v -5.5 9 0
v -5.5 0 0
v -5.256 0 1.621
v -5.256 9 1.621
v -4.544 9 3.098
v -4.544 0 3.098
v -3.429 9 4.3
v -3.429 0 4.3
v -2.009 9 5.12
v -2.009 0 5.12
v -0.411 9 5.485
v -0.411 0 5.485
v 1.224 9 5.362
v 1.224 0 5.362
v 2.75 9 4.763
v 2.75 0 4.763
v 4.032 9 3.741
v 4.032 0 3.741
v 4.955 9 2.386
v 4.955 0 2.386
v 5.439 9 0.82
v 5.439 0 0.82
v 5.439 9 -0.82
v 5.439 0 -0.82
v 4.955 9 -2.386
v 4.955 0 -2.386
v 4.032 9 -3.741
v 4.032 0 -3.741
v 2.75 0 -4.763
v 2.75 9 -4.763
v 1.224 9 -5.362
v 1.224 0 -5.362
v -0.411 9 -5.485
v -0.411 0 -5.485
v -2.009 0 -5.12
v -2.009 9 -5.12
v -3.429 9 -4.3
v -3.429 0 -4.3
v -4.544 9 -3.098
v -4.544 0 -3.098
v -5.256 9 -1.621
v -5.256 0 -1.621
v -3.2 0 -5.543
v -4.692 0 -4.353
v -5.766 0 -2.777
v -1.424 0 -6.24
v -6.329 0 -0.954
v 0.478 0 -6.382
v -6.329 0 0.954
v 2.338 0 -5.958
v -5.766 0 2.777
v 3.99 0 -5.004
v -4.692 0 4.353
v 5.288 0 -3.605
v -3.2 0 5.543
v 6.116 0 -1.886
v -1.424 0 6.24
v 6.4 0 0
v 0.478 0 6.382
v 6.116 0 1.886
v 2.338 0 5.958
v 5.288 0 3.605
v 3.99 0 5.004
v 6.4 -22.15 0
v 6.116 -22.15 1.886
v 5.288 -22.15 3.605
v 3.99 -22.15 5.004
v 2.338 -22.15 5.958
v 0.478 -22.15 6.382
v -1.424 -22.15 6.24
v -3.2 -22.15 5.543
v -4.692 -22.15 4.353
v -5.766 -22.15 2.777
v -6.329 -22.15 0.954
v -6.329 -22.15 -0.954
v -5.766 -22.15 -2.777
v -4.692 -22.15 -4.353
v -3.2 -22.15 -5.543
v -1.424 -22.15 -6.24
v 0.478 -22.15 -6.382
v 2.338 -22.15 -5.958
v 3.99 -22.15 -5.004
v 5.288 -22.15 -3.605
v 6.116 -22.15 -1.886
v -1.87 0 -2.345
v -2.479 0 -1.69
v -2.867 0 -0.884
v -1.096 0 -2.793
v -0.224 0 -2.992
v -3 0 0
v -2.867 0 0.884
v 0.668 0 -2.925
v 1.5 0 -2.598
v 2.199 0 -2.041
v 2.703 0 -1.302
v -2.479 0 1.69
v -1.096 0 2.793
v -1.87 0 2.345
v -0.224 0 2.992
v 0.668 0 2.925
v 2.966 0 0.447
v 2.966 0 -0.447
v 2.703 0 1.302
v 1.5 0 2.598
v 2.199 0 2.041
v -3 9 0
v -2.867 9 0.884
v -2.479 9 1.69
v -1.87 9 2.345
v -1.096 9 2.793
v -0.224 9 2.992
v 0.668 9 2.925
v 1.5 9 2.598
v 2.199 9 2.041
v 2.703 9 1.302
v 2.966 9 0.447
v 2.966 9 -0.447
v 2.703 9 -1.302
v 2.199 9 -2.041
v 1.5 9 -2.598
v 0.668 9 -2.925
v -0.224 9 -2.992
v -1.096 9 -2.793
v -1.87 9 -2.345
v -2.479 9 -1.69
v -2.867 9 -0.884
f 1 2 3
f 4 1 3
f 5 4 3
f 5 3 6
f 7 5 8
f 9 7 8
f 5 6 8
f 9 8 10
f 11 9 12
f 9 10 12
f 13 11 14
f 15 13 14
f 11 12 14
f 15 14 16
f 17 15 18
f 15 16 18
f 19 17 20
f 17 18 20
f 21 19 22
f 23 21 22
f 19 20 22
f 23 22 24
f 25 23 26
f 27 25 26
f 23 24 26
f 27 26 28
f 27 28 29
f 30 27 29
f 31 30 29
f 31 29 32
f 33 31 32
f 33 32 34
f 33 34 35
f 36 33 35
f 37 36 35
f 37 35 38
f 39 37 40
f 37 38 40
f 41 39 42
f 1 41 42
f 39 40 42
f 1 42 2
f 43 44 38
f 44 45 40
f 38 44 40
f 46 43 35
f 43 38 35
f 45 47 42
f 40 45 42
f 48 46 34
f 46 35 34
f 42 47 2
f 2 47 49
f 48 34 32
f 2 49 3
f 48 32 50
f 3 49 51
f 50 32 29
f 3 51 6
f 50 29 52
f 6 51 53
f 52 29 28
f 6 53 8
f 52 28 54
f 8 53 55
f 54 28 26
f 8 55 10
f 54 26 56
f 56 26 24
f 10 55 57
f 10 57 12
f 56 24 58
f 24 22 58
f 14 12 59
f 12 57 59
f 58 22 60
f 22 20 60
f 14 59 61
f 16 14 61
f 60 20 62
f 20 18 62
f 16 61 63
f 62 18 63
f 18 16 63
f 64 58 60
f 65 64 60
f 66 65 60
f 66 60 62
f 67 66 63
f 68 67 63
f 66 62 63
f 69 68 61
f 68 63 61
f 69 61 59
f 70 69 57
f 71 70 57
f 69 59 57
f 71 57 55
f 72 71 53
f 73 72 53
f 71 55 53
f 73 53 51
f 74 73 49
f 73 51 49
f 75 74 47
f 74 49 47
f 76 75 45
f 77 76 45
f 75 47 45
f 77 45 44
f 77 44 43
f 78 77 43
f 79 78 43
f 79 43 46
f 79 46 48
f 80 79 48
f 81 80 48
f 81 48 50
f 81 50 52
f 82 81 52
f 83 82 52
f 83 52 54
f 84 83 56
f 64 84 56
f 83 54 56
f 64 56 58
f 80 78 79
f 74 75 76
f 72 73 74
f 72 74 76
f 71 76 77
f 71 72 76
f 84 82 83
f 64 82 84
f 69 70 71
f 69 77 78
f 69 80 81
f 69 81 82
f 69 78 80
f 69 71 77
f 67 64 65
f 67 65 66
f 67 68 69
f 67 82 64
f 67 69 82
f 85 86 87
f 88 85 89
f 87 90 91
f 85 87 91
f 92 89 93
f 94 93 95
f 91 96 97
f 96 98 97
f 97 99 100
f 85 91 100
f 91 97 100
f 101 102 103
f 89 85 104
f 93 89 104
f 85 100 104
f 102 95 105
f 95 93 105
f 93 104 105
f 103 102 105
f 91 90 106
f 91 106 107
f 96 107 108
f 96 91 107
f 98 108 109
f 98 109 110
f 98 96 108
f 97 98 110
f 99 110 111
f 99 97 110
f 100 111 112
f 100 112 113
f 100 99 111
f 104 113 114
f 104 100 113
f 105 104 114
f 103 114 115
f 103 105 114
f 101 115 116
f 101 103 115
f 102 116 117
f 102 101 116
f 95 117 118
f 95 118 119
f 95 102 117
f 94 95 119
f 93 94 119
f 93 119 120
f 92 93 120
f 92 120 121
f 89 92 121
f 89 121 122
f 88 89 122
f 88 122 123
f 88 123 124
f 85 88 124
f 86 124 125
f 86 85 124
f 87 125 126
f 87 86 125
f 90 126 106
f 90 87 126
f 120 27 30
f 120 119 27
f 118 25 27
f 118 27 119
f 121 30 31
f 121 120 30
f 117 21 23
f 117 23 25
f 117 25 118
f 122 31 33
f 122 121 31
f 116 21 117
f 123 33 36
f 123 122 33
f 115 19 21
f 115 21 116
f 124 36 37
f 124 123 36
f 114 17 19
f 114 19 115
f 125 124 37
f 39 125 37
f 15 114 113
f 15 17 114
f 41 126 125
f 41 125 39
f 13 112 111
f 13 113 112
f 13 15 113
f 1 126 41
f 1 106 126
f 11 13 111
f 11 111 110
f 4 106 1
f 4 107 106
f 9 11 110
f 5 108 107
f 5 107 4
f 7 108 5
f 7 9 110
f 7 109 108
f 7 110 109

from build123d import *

# Parameters (mm, degrees)
F0_R     = 6.4
F1_DEPTH = 22.15
F2_R     = 5.5
F2_R_2   = 3
F3_DEPTH = 9


with BuildPart() as f1:
    # F0 (on Front) → F1 (new body)
    with BuildSketch(Plane.XZ):
        Circle(F0_R)
    extrude(amount=F1_DEPTH)

    # F2 (on face) → F3 (join)
    with BuildSketch(Plane(origin=(0, 0, 0), x_dir=(-1, 0, 0), z_dir=(0, 1, 0))):
        Circle(F2_R)
        Circle(F2_R_2, mode=Mode.SUBTRACT)
    extrude(amount=F3_DEPTH)


solid = f1.part
